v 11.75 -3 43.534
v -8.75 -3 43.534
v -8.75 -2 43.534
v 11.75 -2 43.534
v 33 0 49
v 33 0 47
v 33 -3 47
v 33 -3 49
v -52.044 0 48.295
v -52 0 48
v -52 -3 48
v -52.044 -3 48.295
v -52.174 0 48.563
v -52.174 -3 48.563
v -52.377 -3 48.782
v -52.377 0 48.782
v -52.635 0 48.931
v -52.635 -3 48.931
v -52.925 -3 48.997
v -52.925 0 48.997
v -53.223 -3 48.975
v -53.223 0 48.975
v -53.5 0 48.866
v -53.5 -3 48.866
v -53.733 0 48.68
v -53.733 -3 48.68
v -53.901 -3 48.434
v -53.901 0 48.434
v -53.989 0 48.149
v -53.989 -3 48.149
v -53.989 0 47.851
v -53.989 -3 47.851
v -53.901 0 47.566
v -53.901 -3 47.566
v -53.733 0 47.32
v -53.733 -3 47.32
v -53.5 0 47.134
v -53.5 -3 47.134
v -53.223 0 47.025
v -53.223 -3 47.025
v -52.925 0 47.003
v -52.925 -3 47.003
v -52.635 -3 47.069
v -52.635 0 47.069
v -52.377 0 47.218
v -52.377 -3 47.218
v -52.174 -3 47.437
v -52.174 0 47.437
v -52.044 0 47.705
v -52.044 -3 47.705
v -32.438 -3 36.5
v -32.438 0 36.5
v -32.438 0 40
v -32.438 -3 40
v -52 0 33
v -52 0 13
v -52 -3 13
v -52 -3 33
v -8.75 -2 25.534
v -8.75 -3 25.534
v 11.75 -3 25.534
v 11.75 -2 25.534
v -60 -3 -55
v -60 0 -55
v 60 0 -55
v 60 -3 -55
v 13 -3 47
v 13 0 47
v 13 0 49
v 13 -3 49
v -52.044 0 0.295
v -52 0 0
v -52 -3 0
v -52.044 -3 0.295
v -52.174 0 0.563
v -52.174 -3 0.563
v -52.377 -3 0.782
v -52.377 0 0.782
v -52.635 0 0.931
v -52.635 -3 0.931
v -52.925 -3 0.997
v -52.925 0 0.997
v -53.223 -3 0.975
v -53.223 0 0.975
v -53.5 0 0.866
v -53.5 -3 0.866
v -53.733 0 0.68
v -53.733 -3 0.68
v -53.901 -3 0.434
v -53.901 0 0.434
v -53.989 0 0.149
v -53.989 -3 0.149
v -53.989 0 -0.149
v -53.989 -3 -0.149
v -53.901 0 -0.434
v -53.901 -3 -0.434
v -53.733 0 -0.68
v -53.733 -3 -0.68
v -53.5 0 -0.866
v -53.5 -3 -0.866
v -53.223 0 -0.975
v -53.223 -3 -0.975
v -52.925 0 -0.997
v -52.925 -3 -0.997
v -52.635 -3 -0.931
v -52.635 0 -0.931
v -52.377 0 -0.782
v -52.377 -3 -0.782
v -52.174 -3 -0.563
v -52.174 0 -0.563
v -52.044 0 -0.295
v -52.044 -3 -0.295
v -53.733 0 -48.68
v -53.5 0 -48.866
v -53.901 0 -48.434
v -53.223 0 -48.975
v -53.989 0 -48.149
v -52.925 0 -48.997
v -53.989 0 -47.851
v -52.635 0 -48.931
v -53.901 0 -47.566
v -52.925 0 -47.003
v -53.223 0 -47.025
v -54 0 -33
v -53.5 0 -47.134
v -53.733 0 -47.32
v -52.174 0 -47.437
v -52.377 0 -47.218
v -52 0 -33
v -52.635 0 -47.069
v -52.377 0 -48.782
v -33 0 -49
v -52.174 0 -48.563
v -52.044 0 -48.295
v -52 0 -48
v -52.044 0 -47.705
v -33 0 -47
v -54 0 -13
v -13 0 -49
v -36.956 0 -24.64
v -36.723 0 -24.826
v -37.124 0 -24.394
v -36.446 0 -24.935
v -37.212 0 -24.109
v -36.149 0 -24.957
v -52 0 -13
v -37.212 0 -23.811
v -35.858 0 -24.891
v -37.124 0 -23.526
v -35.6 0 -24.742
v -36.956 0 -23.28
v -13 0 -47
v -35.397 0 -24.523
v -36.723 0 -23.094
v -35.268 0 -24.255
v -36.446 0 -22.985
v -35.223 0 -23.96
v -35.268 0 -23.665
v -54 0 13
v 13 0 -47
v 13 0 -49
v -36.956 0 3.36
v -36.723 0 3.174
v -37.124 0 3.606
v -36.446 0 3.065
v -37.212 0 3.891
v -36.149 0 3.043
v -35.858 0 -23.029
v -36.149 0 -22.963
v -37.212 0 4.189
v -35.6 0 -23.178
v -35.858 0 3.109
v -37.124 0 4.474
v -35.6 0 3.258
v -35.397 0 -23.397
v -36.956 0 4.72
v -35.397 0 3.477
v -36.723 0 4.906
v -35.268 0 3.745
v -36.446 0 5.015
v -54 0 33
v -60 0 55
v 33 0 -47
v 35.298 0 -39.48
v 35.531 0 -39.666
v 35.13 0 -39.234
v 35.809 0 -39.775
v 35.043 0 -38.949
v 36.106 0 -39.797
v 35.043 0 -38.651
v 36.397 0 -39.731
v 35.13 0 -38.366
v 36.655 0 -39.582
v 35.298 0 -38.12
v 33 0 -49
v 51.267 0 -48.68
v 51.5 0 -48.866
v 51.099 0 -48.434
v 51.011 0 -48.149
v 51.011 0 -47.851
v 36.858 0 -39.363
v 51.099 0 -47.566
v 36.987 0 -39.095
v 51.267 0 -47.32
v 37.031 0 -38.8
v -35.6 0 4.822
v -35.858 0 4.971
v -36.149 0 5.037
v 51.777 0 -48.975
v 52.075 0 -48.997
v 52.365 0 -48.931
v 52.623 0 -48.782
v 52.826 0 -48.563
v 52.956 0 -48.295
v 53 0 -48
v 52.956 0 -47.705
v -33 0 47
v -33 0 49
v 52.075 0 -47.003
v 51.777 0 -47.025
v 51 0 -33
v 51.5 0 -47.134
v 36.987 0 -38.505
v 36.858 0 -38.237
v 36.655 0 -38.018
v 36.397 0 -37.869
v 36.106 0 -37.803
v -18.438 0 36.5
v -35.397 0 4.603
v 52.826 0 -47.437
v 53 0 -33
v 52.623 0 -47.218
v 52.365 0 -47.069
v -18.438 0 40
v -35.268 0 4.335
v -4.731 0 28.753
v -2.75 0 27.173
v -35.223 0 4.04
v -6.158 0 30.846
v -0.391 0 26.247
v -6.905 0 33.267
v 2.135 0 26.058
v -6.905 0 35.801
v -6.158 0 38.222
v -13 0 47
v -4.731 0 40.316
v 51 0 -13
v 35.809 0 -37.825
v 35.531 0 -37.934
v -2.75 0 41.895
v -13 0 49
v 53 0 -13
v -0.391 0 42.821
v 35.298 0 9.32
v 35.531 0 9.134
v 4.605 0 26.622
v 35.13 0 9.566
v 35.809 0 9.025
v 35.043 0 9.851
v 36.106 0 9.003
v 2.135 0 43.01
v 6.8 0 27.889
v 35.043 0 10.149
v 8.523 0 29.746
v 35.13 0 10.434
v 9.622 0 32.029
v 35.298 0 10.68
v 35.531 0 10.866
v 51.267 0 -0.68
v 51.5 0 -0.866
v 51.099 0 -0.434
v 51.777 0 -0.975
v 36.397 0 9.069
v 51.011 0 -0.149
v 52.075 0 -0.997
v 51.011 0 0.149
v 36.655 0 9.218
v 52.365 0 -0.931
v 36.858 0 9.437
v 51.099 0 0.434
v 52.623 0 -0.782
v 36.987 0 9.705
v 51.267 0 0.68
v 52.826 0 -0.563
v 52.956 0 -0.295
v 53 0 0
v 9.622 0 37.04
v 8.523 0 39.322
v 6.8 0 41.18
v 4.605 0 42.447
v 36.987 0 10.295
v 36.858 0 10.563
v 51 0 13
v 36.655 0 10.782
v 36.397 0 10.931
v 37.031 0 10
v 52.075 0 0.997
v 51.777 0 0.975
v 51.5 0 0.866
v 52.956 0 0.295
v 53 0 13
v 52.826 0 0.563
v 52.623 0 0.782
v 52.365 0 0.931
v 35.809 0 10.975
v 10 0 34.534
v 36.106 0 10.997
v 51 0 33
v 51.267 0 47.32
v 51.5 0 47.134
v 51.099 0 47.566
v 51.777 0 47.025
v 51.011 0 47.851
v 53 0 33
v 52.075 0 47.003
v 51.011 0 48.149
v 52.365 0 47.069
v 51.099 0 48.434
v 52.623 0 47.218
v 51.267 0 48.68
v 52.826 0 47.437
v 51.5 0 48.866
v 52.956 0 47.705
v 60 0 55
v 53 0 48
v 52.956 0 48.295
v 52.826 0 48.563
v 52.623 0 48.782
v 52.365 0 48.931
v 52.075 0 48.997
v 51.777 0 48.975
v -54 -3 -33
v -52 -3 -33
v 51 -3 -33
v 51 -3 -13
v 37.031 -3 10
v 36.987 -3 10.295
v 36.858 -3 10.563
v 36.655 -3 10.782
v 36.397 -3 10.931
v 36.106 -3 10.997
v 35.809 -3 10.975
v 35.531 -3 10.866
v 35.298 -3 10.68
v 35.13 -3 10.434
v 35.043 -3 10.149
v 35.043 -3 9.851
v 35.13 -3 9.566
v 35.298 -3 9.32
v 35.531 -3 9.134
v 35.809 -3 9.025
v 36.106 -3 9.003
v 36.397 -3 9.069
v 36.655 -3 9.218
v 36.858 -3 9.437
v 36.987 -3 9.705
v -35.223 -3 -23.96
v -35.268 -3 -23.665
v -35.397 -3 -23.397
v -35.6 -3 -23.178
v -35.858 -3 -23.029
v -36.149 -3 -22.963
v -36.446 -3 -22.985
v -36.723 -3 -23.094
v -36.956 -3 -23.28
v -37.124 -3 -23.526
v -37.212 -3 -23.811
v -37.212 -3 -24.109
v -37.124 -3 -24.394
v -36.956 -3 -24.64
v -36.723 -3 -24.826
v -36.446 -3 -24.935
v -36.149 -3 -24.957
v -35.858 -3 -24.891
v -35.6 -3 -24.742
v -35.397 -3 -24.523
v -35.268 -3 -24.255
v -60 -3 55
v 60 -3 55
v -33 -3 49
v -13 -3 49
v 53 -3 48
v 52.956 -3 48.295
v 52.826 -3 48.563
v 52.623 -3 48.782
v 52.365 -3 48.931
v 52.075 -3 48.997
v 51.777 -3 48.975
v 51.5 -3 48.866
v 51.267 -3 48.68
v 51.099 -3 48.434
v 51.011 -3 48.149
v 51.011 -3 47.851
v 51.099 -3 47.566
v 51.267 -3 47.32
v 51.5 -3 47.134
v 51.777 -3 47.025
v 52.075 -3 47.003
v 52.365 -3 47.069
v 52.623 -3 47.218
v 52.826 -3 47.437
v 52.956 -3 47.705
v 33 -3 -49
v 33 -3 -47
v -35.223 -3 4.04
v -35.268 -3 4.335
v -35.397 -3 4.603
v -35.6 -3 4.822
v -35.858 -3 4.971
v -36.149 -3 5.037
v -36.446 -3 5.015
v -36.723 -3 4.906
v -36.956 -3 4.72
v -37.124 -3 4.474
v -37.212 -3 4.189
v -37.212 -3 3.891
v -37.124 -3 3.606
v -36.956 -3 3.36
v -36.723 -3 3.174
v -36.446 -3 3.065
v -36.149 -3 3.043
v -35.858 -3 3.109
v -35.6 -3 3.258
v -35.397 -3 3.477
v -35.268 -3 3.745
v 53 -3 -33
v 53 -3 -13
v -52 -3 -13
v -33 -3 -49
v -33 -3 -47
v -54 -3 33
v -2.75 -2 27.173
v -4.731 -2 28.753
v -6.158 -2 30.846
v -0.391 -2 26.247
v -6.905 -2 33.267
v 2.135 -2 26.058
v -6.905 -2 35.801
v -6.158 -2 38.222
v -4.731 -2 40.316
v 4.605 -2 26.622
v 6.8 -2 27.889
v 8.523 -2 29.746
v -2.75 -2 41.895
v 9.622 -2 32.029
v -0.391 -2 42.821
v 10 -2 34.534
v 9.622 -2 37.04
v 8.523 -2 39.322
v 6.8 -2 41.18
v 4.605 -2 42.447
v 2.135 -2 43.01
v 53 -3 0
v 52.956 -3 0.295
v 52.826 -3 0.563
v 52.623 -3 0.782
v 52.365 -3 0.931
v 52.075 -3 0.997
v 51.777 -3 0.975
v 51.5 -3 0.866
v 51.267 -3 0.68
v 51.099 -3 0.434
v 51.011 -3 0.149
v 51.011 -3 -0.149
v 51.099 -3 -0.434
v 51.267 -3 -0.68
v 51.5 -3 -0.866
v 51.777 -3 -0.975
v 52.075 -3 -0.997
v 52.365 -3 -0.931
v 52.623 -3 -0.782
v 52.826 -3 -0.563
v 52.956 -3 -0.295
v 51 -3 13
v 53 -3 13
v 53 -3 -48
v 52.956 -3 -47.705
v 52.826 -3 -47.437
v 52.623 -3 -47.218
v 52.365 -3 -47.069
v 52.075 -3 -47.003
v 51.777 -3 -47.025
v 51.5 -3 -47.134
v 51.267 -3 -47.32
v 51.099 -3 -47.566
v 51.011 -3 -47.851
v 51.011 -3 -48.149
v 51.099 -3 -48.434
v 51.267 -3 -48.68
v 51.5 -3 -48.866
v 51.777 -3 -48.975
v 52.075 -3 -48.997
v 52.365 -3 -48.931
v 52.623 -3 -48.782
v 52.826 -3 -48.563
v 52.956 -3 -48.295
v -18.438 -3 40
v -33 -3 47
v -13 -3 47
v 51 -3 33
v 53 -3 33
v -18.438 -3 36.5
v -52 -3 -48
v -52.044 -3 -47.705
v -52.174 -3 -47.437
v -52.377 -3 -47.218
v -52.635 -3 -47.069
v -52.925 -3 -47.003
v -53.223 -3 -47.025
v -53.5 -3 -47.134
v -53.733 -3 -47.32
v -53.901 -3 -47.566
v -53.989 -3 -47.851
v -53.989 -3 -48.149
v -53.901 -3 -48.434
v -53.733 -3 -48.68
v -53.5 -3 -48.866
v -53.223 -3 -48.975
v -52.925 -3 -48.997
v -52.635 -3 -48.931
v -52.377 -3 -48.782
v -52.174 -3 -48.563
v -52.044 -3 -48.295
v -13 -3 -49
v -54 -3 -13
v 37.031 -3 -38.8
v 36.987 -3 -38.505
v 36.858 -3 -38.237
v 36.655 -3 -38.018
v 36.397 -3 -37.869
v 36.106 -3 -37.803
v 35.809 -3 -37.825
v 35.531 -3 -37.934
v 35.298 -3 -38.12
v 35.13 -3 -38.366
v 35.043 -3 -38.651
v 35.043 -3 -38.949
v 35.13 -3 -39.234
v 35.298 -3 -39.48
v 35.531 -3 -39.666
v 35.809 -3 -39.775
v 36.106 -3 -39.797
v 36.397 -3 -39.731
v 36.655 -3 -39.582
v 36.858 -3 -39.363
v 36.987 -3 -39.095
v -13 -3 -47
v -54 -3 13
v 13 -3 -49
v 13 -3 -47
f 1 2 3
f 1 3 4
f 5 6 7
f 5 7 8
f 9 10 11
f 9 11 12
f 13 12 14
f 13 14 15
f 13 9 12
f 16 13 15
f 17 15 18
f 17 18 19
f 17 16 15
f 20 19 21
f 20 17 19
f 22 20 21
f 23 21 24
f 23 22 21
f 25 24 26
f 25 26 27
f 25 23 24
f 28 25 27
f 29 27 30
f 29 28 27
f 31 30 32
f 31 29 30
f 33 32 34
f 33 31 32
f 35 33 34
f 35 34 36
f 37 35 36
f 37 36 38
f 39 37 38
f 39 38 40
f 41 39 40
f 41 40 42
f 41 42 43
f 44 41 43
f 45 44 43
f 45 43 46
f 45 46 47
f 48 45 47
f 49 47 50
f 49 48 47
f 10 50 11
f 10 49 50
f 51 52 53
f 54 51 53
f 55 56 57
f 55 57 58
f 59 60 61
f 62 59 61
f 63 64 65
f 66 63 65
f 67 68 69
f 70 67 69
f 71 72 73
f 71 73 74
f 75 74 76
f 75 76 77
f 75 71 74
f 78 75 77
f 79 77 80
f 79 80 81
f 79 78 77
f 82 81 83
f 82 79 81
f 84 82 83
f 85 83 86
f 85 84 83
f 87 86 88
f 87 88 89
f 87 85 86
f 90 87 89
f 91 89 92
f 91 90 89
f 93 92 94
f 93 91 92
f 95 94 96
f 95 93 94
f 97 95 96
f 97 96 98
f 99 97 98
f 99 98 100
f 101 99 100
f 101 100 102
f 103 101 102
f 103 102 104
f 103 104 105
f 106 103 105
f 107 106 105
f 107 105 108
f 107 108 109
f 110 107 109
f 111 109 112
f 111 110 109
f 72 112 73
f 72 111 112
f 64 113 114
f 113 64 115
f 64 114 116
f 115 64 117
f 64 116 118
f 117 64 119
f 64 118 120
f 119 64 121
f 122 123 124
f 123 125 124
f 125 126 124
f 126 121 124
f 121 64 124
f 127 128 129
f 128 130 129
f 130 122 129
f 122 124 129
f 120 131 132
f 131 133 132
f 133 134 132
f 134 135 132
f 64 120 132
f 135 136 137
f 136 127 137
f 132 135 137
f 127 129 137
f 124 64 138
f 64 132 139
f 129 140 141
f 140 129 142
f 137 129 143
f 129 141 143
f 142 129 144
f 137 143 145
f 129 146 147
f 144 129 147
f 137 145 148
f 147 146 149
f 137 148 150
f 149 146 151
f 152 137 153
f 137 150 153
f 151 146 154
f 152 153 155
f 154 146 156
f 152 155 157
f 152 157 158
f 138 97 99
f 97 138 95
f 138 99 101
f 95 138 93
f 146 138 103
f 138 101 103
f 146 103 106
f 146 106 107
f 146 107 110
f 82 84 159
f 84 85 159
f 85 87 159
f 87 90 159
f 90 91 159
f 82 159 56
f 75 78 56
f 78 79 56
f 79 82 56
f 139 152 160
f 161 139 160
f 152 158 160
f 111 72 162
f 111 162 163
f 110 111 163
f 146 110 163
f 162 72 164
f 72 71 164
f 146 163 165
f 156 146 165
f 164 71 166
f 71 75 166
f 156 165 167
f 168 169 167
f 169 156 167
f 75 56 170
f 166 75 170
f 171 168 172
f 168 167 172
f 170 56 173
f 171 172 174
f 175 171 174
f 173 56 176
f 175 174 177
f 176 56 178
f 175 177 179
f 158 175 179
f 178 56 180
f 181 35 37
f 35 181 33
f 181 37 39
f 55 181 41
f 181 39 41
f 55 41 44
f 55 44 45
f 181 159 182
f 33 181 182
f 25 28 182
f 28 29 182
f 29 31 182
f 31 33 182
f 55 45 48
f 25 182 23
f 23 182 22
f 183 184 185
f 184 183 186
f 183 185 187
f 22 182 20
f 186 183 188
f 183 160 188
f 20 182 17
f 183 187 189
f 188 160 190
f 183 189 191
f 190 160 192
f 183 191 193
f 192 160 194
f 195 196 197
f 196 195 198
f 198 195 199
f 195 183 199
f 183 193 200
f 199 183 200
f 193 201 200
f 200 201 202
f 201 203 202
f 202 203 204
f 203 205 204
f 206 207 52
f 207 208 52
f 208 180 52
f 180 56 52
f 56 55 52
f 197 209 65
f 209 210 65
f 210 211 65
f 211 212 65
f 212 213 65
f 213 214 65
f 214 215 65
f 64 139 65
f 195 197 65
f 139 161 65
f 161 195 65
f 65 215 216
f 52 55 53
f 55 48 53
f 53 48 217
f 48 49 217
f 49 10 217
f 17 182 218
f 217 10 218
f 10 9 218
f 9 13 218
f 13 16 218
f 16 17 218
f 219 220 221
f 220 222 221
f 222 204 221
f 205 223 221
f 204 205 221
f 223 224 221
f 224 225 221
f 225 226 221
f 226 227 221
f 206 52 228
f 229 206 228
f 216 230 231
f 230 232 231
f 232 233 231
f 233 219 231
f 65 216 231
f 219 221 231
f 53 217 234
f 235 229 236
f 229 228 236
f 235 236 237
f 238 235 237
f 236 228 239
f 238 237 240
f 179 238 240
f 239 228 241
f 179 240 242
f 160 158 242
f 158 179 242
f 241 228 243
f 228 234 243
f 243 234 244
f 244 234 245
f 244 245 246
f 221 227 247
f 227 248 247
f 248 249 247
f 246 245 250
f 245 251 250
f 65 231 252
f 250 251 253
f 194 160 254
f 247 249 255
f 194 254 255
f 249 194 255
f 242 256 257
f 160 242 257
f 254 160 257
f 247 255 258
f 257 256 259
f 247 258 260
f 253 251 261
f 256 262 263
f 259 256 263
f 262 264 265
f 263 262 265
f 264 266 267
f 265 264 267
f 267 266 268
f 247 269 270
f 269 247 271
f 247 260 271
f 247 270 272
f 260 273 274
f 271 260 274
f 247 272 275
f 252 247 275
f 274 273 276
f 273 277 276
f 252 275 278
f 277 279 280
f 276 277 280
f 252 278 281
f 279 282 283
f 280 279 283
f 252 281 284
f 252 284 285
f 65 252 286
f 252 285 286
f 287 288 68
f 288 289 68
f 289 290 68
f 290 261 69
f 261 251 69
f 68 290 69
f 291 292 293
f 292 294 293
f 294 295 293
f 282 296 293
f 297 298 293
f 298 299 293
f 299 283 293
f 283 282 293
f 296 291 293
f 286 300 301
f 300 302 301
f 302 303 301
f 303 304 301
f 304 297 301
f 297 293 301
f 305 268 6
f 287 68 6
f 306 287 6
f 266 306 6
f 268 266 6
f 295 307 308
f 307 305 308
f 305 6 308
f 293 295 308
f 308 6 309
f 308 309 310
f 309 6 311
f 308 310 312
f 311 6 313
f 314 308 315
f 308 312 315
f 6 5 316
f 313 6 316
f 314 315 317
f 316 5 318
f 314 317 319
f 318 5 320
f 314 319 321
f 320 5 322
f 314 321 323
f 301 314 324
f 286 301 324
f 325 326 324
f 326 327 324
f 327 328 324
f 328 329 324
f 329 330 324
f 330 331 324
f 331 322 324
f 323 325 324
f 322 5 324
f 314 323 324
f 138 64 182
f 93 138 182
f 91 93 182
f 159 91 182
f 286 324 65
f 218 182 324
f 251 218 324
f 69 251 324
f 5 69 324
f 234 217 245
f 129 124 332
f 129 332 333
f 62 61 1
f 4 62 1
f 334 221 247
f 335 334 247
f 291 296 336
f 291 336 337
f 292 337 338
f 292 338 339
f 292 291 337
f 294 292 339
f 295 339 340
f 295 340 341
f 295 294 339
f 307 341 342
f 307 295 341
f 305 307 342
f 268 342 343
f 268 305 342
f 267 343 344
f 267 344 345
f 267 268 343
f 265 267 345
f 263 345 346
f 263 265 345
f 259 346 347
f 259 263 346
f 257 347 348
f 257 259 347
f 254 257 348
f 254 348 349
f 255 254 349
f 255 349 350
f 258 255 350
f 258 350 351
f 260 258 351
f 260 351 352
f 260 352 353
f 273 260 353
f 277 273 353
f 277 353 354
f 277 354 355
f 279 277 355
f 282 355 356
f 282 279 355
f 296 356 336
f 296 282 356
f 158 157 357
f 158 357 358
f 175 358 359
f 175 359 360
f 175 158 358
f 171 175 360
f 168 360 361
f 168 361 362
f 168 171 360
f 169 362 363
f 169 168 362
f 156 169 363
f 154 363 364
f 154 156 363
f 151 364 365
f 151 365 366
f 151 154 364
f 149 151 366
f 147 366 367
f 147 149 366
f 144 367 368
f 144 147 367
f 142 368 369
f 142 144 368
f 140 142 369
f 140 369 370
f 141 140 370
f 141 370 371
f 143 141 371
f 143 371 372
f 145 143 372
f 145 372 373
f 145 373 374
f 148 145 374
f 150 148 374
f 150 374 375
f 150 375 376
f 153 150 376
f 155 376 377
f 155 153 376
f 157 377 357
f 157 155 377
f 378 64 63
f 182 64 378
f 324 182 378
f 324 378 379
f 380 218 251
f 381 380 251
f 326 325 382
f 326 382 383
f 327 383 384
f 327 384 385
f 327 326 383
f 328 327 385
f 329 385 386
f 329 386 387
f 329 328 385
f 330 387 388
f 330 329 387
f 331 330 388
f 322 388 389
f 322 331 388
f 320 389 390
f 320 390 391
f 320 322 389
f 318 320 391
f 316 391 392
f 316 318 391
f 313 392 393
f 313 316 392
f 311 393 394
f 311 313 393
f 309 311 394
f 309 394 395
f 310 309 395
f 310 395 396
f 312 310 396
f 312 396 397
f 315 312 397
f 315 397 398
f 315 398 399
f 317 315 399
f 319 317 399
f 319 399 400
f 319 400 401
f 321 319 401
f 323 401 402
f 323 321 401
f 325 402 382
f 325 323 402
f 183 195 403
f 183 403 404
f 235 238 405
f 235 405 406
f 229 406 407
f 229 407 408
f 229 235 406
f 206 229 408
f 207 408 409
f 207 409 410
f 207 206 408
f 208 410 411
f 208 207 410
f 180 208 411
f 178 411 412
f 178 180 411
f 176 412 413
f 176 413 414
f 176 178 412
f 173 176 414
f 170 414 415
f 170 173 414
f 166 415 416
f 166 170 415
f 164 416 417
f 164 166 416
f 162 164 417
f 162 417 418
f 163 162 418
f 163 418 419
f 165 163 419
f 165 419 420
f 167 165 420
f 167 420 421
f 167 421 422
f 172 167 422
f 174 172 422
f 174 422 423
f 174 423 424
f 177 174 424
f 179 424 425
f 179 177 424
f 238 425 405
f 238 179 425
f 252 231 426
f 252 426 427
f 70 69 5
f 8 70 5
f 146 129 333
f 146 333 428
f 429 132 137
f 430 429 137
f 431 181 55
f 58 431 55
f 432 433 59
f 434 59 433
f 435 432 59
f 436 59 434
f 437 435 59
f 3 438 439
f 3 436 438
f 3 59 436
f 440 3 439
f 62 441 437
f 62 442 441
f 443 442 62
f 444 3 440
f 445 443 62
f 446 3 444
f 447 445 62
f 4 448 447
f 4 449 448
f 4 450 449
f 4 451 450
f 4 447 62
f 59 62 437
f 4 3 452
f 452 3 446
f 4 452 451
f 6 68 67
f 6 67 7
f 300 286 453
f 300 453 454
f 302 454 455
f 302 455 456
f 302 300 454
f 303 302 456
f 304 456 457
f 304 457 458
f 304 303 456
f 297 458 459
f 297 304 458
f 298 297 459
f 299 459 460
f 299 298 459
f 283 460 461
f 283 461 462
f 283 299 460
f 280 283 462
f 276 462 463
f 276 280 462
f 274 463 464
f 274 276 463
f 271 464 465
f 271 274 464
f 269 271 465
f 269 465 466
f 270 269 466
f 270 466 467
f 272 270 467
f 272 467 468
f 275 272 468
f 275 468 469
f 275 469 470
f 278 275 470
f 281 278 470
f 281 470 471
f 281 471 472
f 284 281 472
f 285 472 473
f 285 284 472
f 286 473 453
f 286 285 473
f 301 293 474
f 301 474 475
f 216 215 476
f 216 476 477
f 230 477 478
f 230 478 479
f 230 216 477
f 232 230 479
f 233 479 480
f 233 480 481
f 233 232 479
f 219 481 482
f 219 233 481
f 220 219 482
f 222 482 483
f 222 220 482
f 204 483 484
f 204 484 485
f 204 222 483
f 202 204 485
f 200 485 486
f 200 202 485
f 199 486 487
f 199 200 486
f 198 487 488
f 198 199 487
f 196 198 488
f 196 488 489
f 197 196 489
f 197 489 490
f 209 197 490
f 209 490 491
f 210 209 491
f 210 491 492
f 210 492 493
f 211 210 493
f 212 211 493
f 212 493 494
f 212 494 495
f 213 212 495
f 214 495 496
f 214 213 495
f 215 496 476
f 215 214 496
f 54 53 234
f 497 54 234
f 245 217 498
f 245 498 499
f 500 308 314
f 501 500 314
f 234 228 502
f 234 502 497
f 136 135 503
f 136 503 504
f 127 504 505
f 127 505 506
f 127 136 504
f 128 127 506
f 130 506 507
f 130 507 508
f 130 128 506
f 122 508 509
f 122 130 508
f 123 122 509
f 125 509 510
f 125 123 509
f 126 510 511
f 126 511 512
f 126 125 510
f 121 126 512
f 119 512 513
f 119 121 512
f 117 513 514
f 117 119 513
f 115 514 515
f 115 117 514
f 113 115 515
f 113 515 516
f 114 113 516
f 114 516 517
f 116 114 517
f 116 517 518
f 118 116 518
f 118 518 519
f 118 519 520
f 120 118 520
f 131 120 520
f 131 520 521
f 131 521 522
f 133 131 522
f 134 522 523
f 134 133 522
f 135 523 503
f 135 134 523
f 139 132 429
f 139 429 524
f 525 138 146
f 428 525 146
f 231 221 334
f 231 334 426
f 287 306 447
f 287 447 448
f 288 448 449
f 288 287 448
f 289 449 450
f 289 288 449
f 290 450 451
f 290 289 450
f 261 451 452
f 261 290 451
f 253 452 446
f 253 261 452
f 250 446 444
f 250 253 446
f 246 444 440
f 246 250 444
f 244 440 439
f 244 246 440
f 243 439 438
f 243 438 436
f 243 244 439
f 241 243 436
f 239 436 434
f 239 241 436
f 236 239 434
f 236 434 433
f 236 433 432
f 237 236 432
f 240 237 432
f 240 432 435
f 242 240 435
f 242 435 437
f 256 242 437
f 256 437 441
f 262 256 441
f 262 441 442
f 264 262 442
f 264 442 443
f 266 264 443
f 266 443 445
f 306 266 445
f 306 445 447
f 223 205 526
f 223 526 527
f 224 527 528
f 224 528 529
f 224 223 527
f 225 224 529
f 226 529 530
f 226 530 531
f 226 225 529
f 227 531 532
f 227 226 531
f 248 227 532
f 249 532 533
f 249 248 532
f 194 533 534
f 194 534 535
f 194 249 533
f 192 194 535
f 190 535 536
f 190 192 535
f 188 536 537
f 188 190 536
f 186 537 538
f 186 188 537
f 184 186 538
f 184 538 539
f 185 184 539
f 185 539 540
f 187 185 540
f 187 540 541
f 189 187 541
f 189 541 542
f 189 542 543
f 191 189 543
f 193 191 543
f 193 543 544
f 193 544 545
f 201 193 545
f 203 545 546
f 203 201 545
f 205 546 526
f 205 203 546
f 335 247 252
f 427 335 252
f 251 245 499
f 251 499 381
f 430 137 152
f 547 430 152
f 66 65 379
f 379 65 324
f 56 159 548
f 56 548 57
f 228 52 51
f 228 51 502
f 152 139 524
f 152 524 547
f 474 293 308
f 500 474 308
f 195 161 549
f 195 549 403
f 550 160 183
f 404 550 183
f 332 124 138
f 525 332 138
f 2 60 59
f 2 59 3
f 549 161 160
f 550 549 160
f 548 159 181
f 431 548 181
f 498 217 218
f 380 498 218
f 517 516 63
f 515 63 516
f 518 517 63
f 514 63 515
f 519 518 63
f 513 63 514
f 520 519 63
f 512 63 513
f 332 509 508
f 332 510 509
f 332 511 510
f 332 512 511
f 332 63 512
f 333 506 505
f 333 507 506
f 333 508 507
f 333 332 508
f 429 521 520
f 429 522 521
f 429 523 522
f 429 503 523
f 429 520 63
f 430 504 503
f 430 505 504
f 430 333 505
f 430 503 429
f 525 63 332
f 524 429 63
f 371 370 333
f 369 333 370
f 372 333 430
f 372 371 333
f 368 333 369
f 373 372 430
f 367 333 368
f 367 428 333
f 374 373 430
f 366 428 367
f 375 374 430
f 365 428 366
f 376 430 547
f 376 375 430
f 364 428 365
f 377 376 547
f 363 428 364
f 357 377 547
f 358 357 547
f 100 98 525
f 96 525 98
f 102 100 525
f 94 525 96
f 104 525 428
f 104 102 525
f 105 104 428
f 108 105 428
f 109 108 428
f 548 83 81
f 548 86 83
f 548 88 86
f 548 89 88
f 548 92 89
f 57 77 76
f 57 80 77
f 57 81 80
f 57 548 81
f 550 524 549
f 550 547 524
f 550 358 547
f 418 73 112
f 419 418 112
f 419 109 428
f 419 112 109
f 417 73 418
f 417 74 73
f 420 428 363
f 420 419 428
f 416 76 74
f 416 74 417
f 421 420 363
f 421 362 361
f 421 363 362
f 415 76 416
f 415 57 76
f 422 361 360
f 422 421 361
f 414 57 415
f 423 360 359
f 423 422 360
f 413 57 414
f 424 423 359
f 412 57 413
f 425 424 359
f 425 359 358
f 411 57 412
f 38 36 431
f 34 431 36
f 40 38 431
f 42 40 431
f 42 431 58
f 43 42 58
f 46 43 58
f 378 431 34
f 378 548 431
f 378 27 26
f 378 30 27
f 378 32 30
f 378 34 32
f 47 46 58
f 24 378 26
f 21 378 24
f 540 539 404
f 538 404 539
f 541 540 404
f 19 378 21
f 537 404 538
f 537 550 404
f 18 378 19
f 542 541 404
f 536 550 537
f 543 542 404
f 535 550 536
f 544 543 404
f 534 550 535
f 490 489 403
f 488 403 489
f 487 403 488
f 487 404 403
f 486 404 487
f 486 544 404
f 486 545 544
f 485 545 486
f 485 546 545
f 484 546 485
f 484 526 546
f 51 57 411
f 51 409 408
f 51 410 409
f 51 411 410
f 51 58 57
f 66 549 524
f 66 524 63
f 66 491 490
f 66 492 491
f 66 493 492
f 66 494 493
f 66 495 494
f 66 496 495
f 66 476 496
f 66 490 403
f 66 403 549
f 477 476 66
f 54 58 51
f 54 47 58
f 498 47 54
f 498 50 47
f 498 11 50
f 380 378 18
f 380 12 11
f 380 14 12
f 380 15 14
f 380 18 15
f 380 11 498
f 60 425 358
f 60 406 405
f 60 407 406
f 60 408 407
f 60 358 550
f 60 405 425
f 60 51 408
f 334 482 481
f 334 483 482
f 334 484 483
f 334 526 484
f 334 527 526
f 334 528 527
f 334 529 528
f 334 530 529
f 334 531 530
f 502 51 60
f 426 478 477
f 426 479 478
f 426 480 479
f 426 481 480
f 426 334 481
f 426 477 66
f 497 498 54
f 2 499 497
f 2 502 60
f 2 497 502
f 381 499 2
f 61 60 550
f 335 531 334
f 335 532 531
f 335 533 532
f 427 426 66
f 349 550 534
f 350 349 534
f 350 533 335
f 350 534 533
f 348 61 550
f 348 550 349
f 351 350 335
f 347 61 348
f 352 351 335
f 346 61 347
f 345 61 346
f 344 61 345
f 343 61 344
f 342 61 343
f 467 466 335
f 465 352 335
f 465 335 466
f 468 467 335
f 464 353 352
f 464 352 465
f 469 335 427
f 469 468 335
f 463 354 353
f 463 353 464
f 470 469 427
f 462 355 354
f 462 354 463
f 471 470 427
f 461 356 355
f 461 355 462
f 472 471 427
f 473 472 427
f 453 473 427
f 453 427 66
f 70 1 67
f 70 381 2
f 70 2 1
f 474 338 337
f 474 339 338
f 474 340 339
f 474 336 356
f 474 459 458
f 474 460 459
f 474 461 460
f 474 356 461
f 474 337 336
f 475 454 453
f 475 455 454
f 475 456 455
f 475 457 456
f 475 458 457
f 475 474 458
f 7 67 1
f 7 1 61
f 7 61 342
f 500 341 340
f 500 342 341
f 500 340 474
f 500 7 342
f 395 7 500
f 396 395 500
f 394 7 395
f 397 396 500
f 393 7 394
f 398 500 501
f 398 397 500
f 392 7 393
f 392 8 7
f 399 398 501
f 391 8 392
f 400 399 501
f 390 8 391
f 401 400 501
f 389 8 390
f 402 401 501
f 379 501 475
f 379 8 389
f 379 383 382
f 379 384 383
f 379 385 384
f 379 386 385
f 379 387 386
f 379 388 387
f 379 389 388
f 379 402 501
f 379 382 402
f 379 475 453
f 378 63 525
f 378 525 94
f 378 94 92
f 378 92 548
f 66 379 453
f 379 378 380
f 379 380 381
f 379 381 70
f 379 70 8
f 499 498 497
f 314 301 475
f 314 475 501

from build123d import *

# Parameters (mm, degrees)
F0_W     = 120
F0_H     = 110
F0_R     = 1
F0_W_2   = 20
F0_H_2   = 2
F0_W_3   = 2
F0_H_3   = 20
F0_W_4   = 14
F0_H_4   = 3.5
F0_R_2   = 8.5
F1_DEPTH = 3
F2_W     = 20.5
F2_H     = 18
F2_R     = 8.5
F3_DEPTH = 1


with BuildPart() as f1:
    # F0 (on Front) → F1 (new body)
    with BuildSketch(Plane.XZ):
        Rectangle(F0_W, F0_H)
        with Locations((-53, -48)):
            Circle(F0_R, mode=Mode.SUBTRACT)
        with Locations((-23, -48)):
            Rectangle(F0_W_2, F0_H_2, mode=Mode.SUBTRACT)
        with Locations((-53, -23)):
            Rectangle(F0_W_3, F0_H_3, mode=Mode.SUBTRACT)
        with Locations((-36.223244, -23.959939)):
            Circle(F0_R, mode=Mode.SUBTRACT)
        with Locations((23, -48)):
            Rectangle(F0_W_2, F0_H_2, mode=Mode.SUBTRACT)
        with Locations((52, -48)):
            Circle(F0_R, mode=Mode.SUBTRACT)
        with Locations((36.031369, -38.8)):
            Circle(F0_R, mode=Mode.SUBTRACT)
        with Locations((52, -23)):
            Rectangle(F0_W_3, F0_H_3, mode=Mode.SUBTRACT)
        with Locations((-53, 0)):
            Circle(F0_R, mode=Mode.SUBTRACT)
        with Locations((-36.223244, 4.040061)):
            Circle(F0_R, mode=Mode.SUBTRACT)
        with Locations((-53, 23)):
            Rectangle(F0_W_3, F0_H_3, mode=Mode.SUBTRACT)
        with Locations((-53, 48)):
            Circle(F0_R, mode=Mode.SUBTRACT)
        with Locations((-25.438215, 38.25)):
            Rectangle(F0_W_4, F0_H_4, mode=Mode.SUBTRACT)
        with Locations((-23, 48)):
            Rectangle(F0_W_2, F0_H_2, mode=Mode.SUBTRACT)
        with Locations((36.031369, 10)):
            Circle(F0_R, mode=Mode.SUBTRACT)
        with Locations((52, 0)):
            Circle(F0_R, mode=Mode.SUBTRACT)
        with Locations((52, 23)):
            Rectangle(F0_W_3, F0_H_3, mode=Mode.SUBTRACT)
        with Locations((1.5, 34.534223)):
            Circle(F0_R_2, mode=Mode.SUBTRACT)
        with Locations((23, 48)):
            Rectangle(F0_W_2, F0_H_2, mode=Mode.SUBTRACT)
        with Locations((52, 48)):
            Circle(F0_R, mode=Mode.SUBTRACT)
    extrude(amount=F1_DEPTH)

    # F2 (on face) → F3 (cut)
    with BuildSketch(Plane.XZ.offset(3)):
        with Locations((1.5, 34.534223)):
            Rectangle(F2_W, F2_H)
        with Locations((1.5, 34.534223)):
            Circle(F2_R, mode=Mode.SUBTRACT)
    extrude(amount=-F3_DEPTH, mode=Mode.SUBTRACT)


solid = f1.part
